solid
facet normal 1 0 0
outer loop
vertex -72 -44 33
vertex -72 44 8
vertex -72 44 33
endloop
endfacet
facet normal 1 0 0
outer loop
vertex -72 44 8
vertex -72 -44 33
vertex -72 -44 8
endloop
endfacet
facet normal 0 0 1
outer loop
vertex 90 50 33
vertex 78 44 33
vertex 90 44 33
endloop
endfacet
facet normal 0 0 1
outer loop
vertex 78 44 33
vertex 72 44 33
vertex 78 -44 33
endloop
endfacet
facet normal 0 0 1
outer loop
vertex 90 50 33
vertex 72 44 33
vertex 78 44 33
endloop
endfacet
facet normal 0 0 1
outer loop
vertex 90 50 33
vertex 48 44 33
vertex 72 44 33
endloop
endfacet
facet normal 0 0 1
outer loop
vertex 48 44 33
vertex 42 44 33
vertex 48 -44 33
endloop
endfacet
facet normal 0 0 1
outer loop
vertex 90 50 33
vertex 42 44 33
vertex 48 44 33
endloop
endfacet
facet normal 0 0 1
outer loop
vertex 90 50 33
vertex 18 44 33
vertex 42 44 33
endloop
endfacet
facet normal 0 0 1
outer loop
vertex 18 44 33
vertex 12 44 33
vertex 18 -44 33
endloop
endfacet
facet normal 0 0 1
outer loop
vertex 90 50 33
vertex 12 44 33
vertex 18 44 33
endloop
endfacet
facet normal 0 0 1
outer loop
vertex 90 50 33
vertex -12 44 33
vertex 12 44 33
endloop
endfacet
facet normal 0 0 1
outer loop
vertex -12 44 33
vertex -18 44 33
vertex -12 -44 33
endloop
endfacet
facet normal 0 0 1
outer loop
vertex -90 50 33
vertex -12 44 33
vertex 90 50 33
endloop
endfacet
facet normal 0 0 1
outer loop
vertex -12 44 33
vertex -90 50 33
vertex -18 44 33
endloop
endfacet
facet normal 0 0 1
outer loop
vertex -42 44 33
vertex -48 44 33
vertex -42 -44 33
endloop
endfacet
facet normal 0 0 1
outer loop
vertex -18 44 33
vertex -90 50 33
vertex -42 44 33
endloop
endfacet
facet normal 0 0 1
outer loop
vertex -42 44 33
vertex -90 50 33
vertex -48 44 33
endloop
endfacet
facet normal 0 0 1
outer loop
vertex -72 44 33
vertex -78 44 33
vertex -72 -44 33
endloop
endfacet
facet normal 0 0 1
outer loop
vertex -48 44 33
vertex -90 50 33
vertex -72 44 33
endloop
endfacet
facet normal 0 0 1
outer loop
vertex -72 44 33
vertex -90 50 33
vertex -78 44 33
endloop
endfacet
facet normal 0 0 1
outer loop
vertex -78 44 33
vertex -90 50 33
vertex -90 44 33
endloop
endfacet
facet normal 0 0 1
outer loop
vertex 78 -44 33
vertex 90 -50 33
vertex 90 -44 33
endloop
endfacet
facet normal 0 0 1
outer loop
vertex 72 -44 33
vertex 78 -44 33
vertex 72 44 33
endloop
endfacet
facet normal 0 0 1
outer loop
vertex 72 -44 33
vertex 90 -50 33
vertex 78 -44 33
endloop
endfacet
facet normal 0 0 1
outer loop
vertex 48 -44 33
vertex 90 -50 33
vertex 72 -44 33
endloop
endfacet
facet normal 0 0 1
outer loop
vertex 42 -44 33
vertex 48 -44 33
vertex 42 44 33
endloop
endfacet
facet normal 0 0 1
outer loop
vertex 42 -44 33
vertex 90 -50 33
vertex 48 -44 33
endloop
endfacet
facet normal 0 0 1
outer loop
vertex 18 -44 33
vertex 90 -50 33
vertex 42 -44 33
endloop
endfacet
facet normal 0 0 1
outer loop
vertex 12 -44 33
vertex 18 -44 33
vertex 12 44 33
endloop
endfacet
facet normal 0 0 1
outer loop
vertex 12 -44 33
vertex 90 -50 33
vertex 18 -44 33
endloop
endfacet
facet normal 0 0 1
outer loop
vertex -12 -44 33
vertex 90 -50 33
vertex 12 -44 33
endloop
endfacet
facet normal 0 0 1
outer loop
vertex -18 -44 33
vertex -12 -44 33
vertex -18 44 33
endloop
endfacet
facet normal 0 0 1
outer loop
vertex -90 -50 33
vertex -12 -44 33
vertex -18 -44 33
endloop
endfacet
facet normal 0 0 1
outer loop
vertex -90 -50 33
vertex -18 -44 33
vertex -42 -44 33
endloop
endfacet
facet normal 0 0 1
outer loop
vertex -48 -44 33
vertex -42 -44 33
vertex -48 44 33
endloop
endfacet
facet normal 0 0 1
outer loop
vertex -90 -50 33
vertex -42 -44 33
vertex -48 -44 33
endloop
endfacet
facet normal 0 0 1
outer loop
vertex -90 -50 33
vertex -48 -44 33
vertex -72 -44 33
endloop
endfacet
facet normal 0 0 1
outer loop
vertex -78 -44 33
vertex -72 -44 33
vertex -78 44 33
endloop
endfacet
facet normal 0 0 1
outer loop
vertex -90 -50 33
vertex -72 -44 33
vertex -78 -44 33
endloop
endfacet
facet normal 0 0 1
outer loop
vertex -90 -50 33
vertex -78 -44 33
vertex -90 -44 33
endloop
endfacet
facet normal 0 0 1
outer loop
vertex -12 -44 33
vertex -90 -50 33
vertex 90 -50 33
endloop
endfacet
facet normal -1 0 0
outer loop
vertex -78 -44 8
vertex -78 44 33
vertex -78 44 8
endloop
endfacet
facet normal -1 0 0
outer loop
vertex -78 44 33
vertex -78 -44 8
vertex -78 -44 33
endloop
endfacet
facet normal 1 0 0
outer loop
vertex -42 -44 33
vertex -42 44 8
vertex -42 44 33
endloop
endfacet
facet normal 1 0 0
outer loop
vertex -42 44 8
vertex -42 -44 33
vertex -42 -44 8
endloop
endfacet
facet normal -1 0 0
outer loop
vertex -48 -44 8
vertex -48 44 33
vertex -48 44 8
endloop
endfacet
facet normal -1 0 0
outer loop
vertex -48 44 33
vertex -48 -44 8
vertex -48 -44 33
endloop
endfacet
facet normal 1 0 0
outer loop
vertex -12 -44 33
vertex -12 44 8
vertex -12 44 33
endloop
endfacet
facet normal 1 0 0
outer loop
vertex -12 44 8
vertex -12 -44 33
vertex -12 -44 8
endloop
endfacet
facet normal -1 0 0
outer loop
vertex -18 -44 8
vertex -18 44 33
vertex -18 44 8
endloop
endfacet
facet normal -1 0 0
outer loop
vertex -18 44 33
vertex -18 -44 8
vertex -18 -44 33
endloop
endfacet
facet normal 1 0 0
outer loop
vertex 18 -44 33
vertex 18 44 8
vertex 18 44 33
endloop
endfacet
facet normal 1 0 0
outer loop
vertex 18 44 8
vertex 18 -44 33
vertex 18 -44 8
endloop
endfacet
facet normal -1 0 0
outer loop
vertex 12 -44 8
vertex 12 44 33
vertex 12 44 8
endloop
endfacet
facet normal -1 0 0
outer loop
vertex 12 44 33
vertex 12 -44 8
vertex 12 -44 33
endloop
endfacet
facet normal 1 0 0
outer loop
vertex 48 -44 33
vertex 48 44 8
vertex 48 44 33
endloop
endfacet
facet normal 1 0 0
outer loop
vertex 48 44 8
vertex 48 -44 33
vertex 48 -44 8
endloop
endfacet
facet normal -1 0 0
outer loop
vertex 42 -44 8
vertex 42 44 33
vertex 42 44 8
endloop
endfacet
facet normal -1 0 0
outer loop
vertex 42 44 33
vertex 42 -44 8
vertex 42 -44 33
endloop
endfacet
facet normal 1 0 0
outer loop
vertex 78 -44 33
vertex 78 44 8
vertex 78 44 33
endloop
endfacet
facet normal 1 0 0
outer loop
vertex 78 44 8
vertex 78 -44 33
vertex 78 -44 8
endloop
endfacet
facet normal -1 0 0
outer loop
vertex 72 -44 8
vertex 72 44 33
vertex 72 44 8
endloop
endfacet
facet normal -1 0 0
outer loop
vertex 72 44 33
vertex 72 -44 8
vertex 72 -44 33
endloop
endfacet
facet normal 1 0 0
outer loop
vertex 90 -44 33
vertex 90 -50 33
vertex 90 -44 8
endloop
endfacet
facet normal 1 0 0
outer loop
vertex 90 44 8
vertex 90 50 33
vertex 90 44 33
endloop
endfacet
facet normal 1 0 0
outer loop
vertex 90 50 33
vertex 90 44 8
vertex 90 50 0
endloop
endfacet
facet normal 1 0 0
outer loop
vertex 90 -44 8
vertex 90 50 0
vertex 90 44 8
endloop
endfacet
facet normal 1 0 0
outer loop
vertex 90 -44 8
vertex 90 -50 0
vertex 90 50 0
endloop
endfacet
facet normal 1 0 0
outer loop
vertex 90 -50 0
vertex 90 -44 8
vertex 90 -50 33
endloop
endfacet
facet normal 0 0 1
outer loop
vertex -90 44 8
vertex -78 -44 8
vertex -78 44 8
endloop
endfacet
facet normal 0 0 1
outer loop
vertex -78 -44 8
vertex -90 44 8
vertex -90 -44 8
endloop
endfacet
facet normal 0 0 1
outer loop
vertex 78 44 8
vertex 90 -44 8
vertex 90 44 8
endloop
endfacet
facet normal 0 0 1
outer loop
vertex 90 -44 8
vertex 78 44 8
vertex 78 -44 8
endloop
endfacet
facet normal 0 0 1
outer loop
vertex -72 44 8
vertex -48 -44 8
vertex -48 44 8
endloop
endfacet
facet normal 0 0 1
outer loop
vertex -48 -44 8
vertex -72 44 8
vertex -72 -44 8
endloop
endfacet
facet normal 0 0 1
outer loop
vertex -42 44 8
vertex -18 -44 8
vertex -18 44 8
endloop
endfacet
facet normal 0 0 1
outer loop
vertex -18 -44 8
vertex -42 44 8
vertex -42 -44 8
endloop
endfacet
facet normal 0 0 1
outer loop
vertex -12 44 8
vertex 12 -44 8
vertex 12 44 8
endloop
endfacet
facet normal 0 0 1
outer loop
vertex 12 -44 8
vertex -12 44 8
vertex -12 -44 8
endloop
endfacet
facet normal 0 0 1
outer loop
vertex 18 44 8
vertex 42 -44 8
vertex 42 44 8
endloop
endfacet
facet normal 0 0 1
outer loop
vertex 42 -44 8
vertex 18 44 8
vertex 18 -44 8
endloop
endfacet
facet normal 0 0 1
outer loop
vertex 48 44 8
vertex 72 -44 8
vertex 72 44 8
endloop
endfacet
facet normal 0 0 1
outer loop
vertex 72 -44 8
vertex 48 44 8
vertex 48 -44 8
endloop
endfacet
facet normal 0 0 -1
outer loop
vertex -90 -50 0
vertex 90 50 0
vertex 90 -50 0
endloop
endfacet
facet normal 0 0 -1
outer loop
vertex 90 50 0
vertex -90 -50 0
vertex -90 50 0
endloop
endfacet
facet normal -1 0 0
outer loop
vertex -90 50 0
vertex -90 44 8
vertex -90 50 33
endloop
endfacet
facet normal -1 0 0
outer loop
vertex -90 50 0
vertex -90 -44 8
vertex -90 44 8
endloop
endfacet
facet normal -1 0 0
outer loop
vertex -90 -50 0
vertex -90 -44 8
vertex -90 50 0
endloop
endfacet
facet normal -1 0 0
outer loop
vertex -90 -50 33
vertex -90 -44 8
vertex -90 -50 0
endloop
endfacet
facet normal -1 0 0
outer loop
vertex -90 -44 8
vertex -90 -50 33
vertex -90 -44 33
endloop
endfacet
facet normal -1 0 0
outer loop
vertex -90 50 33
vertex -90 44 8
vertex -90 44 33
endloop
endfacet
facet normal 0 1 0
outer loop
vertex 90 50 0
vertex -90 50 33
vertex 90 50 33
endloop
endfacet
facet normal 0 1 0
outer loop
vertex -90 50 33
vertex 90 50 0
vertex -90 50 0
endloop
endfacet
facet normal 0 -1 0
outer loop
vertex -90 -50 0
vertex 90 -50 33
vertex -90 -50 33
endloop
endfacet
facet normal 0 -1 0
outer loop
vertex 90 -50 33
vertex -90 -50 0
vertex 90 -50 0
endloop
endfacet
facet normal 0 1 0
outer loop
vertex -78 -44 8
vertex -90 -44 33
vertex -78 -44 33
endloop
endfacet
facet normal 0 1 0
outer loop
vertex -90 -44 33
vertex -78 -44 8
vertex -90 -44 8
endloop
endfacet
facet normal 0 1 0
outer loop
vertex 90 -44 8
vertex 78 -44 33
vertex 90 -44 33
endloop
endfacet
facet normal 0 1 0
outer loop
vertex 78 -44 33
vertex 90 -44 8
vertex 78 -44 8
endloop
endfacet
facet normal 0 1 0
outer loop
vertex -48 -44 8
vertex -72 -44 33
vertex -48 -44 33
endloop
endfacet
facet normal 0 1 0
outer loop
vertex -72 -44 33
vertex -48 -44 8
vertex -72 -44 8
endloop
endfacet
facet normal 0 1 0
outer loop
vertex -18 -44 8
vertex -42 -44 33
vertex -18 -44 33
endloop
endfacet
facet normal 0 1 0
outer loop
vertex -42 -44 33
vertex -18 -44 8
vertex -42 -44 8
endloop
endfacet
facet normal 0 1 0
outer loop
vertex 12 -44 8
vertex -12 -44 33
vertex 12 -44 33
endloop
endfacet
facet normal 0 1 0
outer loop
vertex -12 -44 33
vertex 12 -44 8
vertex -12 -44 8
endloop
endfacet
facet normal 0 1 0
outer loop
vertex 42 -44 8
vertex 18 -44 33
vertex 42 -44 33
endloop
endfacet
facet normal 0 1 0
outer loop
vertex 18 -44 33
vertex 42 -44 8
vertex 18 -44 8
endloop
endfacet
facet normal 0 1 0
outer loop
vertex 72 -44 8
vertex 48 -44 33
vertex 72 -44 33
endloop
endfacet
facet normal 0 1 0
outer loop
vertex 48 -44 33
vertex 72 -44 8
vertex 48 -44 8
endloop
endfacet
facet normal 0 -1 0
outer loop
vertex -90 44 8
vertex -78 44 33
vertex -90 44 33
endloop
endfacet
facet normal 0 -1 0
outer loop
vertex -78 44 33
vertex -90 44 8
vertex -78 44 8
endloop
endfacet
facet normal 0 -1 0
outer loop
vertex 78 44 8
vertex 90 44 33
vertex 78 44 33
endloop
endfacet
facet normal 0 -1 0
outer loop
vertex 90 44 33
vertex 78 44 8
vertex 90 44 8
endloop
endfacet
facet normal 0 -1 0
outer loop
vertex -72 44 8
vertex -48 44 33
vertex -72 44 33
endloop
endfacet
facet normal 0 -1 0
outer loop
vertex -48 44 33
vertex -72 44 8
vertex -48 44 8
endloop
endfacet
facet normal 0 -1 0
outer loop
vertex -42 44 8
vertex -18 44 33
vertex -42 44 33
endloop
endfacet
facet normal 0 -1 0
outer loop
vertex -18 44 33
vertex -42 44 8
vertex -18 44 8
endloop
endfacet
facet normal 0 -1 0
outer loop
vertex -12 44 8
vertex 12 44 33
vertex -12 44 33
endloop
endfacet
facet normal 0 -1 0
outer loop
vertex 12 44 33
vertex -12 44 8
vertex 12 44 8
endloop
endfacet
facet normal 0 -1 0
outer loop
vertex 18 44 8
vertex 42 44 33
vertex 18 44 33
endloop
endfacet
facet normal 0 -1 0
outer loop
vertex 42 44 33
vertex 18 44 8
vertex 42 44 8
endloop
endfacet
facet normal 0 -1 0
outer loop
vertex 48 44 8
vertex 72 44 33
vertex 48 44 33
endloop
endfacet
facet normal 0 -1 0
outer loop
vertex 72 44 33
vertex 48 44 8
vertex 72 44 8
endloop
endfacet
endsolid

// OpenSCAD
$fn = 32;

// ----------------------------------------------------------------------
// Rib frame 180 x 100 x 33
// 6 ribs at 30 mm pitch
// ----------------------------------------------------------------------

// --- parameters (mm) ---
frame = [180, 100, 8];  // base plate size (x, y, z)
rail_w = 6;             // side rail width
ribs = 6;               // number of ribs
rib_t = 6;              // rib thickness
rib_h = 25;             // rib height above the base plate
pitch = 30;             // pitch between rib centres

// --- derived feature positions (mm) ---
span = (ribs - 1) * pitch;          // = 150   distance between the outer ribs
origin_x = -span / 2;               // = -75   X of the first rib
rib_len = frame[1] - 2 * rail_w + 2;  // = 90   rib length, 1 mm into each rail
feature_centers = [
  [origin_x + 0 * pitch, 0],
  [origin_x + 1 * pitch, 0],
  [origin_x + 2 * pitch, 0],
  [origin_x + 3 * pitch, 0],
  [origin_x + 4 * pitch, 0],
  [origin_x + 5 * pitch, 0]
];   // rib centre line, drives the rib loop

// base plate, two side rails, then the ribs read straight off feature_centers
union() {
  translate([-frame[0] / 2, -frame[1] / 2, 0]) cube(frame);
  translate([-frame[0] / 2, -frame[1] / 2, 0]) cube([frame[0], rail_w, frame[2] + rib_h]);
  translate([-frame[0] / 2, frame[1] / 2 - rail_w, 0]) cube([frame[0], rail_w, frame[2] + rib_h]);
  for (centre = feature_centers)
    translate([centre[0] - rib_t / 2, centre[1] - rib_len / 2, frame[2] - 1])
      cube([rib_t, rib_len, rib_h + 1]);
}
